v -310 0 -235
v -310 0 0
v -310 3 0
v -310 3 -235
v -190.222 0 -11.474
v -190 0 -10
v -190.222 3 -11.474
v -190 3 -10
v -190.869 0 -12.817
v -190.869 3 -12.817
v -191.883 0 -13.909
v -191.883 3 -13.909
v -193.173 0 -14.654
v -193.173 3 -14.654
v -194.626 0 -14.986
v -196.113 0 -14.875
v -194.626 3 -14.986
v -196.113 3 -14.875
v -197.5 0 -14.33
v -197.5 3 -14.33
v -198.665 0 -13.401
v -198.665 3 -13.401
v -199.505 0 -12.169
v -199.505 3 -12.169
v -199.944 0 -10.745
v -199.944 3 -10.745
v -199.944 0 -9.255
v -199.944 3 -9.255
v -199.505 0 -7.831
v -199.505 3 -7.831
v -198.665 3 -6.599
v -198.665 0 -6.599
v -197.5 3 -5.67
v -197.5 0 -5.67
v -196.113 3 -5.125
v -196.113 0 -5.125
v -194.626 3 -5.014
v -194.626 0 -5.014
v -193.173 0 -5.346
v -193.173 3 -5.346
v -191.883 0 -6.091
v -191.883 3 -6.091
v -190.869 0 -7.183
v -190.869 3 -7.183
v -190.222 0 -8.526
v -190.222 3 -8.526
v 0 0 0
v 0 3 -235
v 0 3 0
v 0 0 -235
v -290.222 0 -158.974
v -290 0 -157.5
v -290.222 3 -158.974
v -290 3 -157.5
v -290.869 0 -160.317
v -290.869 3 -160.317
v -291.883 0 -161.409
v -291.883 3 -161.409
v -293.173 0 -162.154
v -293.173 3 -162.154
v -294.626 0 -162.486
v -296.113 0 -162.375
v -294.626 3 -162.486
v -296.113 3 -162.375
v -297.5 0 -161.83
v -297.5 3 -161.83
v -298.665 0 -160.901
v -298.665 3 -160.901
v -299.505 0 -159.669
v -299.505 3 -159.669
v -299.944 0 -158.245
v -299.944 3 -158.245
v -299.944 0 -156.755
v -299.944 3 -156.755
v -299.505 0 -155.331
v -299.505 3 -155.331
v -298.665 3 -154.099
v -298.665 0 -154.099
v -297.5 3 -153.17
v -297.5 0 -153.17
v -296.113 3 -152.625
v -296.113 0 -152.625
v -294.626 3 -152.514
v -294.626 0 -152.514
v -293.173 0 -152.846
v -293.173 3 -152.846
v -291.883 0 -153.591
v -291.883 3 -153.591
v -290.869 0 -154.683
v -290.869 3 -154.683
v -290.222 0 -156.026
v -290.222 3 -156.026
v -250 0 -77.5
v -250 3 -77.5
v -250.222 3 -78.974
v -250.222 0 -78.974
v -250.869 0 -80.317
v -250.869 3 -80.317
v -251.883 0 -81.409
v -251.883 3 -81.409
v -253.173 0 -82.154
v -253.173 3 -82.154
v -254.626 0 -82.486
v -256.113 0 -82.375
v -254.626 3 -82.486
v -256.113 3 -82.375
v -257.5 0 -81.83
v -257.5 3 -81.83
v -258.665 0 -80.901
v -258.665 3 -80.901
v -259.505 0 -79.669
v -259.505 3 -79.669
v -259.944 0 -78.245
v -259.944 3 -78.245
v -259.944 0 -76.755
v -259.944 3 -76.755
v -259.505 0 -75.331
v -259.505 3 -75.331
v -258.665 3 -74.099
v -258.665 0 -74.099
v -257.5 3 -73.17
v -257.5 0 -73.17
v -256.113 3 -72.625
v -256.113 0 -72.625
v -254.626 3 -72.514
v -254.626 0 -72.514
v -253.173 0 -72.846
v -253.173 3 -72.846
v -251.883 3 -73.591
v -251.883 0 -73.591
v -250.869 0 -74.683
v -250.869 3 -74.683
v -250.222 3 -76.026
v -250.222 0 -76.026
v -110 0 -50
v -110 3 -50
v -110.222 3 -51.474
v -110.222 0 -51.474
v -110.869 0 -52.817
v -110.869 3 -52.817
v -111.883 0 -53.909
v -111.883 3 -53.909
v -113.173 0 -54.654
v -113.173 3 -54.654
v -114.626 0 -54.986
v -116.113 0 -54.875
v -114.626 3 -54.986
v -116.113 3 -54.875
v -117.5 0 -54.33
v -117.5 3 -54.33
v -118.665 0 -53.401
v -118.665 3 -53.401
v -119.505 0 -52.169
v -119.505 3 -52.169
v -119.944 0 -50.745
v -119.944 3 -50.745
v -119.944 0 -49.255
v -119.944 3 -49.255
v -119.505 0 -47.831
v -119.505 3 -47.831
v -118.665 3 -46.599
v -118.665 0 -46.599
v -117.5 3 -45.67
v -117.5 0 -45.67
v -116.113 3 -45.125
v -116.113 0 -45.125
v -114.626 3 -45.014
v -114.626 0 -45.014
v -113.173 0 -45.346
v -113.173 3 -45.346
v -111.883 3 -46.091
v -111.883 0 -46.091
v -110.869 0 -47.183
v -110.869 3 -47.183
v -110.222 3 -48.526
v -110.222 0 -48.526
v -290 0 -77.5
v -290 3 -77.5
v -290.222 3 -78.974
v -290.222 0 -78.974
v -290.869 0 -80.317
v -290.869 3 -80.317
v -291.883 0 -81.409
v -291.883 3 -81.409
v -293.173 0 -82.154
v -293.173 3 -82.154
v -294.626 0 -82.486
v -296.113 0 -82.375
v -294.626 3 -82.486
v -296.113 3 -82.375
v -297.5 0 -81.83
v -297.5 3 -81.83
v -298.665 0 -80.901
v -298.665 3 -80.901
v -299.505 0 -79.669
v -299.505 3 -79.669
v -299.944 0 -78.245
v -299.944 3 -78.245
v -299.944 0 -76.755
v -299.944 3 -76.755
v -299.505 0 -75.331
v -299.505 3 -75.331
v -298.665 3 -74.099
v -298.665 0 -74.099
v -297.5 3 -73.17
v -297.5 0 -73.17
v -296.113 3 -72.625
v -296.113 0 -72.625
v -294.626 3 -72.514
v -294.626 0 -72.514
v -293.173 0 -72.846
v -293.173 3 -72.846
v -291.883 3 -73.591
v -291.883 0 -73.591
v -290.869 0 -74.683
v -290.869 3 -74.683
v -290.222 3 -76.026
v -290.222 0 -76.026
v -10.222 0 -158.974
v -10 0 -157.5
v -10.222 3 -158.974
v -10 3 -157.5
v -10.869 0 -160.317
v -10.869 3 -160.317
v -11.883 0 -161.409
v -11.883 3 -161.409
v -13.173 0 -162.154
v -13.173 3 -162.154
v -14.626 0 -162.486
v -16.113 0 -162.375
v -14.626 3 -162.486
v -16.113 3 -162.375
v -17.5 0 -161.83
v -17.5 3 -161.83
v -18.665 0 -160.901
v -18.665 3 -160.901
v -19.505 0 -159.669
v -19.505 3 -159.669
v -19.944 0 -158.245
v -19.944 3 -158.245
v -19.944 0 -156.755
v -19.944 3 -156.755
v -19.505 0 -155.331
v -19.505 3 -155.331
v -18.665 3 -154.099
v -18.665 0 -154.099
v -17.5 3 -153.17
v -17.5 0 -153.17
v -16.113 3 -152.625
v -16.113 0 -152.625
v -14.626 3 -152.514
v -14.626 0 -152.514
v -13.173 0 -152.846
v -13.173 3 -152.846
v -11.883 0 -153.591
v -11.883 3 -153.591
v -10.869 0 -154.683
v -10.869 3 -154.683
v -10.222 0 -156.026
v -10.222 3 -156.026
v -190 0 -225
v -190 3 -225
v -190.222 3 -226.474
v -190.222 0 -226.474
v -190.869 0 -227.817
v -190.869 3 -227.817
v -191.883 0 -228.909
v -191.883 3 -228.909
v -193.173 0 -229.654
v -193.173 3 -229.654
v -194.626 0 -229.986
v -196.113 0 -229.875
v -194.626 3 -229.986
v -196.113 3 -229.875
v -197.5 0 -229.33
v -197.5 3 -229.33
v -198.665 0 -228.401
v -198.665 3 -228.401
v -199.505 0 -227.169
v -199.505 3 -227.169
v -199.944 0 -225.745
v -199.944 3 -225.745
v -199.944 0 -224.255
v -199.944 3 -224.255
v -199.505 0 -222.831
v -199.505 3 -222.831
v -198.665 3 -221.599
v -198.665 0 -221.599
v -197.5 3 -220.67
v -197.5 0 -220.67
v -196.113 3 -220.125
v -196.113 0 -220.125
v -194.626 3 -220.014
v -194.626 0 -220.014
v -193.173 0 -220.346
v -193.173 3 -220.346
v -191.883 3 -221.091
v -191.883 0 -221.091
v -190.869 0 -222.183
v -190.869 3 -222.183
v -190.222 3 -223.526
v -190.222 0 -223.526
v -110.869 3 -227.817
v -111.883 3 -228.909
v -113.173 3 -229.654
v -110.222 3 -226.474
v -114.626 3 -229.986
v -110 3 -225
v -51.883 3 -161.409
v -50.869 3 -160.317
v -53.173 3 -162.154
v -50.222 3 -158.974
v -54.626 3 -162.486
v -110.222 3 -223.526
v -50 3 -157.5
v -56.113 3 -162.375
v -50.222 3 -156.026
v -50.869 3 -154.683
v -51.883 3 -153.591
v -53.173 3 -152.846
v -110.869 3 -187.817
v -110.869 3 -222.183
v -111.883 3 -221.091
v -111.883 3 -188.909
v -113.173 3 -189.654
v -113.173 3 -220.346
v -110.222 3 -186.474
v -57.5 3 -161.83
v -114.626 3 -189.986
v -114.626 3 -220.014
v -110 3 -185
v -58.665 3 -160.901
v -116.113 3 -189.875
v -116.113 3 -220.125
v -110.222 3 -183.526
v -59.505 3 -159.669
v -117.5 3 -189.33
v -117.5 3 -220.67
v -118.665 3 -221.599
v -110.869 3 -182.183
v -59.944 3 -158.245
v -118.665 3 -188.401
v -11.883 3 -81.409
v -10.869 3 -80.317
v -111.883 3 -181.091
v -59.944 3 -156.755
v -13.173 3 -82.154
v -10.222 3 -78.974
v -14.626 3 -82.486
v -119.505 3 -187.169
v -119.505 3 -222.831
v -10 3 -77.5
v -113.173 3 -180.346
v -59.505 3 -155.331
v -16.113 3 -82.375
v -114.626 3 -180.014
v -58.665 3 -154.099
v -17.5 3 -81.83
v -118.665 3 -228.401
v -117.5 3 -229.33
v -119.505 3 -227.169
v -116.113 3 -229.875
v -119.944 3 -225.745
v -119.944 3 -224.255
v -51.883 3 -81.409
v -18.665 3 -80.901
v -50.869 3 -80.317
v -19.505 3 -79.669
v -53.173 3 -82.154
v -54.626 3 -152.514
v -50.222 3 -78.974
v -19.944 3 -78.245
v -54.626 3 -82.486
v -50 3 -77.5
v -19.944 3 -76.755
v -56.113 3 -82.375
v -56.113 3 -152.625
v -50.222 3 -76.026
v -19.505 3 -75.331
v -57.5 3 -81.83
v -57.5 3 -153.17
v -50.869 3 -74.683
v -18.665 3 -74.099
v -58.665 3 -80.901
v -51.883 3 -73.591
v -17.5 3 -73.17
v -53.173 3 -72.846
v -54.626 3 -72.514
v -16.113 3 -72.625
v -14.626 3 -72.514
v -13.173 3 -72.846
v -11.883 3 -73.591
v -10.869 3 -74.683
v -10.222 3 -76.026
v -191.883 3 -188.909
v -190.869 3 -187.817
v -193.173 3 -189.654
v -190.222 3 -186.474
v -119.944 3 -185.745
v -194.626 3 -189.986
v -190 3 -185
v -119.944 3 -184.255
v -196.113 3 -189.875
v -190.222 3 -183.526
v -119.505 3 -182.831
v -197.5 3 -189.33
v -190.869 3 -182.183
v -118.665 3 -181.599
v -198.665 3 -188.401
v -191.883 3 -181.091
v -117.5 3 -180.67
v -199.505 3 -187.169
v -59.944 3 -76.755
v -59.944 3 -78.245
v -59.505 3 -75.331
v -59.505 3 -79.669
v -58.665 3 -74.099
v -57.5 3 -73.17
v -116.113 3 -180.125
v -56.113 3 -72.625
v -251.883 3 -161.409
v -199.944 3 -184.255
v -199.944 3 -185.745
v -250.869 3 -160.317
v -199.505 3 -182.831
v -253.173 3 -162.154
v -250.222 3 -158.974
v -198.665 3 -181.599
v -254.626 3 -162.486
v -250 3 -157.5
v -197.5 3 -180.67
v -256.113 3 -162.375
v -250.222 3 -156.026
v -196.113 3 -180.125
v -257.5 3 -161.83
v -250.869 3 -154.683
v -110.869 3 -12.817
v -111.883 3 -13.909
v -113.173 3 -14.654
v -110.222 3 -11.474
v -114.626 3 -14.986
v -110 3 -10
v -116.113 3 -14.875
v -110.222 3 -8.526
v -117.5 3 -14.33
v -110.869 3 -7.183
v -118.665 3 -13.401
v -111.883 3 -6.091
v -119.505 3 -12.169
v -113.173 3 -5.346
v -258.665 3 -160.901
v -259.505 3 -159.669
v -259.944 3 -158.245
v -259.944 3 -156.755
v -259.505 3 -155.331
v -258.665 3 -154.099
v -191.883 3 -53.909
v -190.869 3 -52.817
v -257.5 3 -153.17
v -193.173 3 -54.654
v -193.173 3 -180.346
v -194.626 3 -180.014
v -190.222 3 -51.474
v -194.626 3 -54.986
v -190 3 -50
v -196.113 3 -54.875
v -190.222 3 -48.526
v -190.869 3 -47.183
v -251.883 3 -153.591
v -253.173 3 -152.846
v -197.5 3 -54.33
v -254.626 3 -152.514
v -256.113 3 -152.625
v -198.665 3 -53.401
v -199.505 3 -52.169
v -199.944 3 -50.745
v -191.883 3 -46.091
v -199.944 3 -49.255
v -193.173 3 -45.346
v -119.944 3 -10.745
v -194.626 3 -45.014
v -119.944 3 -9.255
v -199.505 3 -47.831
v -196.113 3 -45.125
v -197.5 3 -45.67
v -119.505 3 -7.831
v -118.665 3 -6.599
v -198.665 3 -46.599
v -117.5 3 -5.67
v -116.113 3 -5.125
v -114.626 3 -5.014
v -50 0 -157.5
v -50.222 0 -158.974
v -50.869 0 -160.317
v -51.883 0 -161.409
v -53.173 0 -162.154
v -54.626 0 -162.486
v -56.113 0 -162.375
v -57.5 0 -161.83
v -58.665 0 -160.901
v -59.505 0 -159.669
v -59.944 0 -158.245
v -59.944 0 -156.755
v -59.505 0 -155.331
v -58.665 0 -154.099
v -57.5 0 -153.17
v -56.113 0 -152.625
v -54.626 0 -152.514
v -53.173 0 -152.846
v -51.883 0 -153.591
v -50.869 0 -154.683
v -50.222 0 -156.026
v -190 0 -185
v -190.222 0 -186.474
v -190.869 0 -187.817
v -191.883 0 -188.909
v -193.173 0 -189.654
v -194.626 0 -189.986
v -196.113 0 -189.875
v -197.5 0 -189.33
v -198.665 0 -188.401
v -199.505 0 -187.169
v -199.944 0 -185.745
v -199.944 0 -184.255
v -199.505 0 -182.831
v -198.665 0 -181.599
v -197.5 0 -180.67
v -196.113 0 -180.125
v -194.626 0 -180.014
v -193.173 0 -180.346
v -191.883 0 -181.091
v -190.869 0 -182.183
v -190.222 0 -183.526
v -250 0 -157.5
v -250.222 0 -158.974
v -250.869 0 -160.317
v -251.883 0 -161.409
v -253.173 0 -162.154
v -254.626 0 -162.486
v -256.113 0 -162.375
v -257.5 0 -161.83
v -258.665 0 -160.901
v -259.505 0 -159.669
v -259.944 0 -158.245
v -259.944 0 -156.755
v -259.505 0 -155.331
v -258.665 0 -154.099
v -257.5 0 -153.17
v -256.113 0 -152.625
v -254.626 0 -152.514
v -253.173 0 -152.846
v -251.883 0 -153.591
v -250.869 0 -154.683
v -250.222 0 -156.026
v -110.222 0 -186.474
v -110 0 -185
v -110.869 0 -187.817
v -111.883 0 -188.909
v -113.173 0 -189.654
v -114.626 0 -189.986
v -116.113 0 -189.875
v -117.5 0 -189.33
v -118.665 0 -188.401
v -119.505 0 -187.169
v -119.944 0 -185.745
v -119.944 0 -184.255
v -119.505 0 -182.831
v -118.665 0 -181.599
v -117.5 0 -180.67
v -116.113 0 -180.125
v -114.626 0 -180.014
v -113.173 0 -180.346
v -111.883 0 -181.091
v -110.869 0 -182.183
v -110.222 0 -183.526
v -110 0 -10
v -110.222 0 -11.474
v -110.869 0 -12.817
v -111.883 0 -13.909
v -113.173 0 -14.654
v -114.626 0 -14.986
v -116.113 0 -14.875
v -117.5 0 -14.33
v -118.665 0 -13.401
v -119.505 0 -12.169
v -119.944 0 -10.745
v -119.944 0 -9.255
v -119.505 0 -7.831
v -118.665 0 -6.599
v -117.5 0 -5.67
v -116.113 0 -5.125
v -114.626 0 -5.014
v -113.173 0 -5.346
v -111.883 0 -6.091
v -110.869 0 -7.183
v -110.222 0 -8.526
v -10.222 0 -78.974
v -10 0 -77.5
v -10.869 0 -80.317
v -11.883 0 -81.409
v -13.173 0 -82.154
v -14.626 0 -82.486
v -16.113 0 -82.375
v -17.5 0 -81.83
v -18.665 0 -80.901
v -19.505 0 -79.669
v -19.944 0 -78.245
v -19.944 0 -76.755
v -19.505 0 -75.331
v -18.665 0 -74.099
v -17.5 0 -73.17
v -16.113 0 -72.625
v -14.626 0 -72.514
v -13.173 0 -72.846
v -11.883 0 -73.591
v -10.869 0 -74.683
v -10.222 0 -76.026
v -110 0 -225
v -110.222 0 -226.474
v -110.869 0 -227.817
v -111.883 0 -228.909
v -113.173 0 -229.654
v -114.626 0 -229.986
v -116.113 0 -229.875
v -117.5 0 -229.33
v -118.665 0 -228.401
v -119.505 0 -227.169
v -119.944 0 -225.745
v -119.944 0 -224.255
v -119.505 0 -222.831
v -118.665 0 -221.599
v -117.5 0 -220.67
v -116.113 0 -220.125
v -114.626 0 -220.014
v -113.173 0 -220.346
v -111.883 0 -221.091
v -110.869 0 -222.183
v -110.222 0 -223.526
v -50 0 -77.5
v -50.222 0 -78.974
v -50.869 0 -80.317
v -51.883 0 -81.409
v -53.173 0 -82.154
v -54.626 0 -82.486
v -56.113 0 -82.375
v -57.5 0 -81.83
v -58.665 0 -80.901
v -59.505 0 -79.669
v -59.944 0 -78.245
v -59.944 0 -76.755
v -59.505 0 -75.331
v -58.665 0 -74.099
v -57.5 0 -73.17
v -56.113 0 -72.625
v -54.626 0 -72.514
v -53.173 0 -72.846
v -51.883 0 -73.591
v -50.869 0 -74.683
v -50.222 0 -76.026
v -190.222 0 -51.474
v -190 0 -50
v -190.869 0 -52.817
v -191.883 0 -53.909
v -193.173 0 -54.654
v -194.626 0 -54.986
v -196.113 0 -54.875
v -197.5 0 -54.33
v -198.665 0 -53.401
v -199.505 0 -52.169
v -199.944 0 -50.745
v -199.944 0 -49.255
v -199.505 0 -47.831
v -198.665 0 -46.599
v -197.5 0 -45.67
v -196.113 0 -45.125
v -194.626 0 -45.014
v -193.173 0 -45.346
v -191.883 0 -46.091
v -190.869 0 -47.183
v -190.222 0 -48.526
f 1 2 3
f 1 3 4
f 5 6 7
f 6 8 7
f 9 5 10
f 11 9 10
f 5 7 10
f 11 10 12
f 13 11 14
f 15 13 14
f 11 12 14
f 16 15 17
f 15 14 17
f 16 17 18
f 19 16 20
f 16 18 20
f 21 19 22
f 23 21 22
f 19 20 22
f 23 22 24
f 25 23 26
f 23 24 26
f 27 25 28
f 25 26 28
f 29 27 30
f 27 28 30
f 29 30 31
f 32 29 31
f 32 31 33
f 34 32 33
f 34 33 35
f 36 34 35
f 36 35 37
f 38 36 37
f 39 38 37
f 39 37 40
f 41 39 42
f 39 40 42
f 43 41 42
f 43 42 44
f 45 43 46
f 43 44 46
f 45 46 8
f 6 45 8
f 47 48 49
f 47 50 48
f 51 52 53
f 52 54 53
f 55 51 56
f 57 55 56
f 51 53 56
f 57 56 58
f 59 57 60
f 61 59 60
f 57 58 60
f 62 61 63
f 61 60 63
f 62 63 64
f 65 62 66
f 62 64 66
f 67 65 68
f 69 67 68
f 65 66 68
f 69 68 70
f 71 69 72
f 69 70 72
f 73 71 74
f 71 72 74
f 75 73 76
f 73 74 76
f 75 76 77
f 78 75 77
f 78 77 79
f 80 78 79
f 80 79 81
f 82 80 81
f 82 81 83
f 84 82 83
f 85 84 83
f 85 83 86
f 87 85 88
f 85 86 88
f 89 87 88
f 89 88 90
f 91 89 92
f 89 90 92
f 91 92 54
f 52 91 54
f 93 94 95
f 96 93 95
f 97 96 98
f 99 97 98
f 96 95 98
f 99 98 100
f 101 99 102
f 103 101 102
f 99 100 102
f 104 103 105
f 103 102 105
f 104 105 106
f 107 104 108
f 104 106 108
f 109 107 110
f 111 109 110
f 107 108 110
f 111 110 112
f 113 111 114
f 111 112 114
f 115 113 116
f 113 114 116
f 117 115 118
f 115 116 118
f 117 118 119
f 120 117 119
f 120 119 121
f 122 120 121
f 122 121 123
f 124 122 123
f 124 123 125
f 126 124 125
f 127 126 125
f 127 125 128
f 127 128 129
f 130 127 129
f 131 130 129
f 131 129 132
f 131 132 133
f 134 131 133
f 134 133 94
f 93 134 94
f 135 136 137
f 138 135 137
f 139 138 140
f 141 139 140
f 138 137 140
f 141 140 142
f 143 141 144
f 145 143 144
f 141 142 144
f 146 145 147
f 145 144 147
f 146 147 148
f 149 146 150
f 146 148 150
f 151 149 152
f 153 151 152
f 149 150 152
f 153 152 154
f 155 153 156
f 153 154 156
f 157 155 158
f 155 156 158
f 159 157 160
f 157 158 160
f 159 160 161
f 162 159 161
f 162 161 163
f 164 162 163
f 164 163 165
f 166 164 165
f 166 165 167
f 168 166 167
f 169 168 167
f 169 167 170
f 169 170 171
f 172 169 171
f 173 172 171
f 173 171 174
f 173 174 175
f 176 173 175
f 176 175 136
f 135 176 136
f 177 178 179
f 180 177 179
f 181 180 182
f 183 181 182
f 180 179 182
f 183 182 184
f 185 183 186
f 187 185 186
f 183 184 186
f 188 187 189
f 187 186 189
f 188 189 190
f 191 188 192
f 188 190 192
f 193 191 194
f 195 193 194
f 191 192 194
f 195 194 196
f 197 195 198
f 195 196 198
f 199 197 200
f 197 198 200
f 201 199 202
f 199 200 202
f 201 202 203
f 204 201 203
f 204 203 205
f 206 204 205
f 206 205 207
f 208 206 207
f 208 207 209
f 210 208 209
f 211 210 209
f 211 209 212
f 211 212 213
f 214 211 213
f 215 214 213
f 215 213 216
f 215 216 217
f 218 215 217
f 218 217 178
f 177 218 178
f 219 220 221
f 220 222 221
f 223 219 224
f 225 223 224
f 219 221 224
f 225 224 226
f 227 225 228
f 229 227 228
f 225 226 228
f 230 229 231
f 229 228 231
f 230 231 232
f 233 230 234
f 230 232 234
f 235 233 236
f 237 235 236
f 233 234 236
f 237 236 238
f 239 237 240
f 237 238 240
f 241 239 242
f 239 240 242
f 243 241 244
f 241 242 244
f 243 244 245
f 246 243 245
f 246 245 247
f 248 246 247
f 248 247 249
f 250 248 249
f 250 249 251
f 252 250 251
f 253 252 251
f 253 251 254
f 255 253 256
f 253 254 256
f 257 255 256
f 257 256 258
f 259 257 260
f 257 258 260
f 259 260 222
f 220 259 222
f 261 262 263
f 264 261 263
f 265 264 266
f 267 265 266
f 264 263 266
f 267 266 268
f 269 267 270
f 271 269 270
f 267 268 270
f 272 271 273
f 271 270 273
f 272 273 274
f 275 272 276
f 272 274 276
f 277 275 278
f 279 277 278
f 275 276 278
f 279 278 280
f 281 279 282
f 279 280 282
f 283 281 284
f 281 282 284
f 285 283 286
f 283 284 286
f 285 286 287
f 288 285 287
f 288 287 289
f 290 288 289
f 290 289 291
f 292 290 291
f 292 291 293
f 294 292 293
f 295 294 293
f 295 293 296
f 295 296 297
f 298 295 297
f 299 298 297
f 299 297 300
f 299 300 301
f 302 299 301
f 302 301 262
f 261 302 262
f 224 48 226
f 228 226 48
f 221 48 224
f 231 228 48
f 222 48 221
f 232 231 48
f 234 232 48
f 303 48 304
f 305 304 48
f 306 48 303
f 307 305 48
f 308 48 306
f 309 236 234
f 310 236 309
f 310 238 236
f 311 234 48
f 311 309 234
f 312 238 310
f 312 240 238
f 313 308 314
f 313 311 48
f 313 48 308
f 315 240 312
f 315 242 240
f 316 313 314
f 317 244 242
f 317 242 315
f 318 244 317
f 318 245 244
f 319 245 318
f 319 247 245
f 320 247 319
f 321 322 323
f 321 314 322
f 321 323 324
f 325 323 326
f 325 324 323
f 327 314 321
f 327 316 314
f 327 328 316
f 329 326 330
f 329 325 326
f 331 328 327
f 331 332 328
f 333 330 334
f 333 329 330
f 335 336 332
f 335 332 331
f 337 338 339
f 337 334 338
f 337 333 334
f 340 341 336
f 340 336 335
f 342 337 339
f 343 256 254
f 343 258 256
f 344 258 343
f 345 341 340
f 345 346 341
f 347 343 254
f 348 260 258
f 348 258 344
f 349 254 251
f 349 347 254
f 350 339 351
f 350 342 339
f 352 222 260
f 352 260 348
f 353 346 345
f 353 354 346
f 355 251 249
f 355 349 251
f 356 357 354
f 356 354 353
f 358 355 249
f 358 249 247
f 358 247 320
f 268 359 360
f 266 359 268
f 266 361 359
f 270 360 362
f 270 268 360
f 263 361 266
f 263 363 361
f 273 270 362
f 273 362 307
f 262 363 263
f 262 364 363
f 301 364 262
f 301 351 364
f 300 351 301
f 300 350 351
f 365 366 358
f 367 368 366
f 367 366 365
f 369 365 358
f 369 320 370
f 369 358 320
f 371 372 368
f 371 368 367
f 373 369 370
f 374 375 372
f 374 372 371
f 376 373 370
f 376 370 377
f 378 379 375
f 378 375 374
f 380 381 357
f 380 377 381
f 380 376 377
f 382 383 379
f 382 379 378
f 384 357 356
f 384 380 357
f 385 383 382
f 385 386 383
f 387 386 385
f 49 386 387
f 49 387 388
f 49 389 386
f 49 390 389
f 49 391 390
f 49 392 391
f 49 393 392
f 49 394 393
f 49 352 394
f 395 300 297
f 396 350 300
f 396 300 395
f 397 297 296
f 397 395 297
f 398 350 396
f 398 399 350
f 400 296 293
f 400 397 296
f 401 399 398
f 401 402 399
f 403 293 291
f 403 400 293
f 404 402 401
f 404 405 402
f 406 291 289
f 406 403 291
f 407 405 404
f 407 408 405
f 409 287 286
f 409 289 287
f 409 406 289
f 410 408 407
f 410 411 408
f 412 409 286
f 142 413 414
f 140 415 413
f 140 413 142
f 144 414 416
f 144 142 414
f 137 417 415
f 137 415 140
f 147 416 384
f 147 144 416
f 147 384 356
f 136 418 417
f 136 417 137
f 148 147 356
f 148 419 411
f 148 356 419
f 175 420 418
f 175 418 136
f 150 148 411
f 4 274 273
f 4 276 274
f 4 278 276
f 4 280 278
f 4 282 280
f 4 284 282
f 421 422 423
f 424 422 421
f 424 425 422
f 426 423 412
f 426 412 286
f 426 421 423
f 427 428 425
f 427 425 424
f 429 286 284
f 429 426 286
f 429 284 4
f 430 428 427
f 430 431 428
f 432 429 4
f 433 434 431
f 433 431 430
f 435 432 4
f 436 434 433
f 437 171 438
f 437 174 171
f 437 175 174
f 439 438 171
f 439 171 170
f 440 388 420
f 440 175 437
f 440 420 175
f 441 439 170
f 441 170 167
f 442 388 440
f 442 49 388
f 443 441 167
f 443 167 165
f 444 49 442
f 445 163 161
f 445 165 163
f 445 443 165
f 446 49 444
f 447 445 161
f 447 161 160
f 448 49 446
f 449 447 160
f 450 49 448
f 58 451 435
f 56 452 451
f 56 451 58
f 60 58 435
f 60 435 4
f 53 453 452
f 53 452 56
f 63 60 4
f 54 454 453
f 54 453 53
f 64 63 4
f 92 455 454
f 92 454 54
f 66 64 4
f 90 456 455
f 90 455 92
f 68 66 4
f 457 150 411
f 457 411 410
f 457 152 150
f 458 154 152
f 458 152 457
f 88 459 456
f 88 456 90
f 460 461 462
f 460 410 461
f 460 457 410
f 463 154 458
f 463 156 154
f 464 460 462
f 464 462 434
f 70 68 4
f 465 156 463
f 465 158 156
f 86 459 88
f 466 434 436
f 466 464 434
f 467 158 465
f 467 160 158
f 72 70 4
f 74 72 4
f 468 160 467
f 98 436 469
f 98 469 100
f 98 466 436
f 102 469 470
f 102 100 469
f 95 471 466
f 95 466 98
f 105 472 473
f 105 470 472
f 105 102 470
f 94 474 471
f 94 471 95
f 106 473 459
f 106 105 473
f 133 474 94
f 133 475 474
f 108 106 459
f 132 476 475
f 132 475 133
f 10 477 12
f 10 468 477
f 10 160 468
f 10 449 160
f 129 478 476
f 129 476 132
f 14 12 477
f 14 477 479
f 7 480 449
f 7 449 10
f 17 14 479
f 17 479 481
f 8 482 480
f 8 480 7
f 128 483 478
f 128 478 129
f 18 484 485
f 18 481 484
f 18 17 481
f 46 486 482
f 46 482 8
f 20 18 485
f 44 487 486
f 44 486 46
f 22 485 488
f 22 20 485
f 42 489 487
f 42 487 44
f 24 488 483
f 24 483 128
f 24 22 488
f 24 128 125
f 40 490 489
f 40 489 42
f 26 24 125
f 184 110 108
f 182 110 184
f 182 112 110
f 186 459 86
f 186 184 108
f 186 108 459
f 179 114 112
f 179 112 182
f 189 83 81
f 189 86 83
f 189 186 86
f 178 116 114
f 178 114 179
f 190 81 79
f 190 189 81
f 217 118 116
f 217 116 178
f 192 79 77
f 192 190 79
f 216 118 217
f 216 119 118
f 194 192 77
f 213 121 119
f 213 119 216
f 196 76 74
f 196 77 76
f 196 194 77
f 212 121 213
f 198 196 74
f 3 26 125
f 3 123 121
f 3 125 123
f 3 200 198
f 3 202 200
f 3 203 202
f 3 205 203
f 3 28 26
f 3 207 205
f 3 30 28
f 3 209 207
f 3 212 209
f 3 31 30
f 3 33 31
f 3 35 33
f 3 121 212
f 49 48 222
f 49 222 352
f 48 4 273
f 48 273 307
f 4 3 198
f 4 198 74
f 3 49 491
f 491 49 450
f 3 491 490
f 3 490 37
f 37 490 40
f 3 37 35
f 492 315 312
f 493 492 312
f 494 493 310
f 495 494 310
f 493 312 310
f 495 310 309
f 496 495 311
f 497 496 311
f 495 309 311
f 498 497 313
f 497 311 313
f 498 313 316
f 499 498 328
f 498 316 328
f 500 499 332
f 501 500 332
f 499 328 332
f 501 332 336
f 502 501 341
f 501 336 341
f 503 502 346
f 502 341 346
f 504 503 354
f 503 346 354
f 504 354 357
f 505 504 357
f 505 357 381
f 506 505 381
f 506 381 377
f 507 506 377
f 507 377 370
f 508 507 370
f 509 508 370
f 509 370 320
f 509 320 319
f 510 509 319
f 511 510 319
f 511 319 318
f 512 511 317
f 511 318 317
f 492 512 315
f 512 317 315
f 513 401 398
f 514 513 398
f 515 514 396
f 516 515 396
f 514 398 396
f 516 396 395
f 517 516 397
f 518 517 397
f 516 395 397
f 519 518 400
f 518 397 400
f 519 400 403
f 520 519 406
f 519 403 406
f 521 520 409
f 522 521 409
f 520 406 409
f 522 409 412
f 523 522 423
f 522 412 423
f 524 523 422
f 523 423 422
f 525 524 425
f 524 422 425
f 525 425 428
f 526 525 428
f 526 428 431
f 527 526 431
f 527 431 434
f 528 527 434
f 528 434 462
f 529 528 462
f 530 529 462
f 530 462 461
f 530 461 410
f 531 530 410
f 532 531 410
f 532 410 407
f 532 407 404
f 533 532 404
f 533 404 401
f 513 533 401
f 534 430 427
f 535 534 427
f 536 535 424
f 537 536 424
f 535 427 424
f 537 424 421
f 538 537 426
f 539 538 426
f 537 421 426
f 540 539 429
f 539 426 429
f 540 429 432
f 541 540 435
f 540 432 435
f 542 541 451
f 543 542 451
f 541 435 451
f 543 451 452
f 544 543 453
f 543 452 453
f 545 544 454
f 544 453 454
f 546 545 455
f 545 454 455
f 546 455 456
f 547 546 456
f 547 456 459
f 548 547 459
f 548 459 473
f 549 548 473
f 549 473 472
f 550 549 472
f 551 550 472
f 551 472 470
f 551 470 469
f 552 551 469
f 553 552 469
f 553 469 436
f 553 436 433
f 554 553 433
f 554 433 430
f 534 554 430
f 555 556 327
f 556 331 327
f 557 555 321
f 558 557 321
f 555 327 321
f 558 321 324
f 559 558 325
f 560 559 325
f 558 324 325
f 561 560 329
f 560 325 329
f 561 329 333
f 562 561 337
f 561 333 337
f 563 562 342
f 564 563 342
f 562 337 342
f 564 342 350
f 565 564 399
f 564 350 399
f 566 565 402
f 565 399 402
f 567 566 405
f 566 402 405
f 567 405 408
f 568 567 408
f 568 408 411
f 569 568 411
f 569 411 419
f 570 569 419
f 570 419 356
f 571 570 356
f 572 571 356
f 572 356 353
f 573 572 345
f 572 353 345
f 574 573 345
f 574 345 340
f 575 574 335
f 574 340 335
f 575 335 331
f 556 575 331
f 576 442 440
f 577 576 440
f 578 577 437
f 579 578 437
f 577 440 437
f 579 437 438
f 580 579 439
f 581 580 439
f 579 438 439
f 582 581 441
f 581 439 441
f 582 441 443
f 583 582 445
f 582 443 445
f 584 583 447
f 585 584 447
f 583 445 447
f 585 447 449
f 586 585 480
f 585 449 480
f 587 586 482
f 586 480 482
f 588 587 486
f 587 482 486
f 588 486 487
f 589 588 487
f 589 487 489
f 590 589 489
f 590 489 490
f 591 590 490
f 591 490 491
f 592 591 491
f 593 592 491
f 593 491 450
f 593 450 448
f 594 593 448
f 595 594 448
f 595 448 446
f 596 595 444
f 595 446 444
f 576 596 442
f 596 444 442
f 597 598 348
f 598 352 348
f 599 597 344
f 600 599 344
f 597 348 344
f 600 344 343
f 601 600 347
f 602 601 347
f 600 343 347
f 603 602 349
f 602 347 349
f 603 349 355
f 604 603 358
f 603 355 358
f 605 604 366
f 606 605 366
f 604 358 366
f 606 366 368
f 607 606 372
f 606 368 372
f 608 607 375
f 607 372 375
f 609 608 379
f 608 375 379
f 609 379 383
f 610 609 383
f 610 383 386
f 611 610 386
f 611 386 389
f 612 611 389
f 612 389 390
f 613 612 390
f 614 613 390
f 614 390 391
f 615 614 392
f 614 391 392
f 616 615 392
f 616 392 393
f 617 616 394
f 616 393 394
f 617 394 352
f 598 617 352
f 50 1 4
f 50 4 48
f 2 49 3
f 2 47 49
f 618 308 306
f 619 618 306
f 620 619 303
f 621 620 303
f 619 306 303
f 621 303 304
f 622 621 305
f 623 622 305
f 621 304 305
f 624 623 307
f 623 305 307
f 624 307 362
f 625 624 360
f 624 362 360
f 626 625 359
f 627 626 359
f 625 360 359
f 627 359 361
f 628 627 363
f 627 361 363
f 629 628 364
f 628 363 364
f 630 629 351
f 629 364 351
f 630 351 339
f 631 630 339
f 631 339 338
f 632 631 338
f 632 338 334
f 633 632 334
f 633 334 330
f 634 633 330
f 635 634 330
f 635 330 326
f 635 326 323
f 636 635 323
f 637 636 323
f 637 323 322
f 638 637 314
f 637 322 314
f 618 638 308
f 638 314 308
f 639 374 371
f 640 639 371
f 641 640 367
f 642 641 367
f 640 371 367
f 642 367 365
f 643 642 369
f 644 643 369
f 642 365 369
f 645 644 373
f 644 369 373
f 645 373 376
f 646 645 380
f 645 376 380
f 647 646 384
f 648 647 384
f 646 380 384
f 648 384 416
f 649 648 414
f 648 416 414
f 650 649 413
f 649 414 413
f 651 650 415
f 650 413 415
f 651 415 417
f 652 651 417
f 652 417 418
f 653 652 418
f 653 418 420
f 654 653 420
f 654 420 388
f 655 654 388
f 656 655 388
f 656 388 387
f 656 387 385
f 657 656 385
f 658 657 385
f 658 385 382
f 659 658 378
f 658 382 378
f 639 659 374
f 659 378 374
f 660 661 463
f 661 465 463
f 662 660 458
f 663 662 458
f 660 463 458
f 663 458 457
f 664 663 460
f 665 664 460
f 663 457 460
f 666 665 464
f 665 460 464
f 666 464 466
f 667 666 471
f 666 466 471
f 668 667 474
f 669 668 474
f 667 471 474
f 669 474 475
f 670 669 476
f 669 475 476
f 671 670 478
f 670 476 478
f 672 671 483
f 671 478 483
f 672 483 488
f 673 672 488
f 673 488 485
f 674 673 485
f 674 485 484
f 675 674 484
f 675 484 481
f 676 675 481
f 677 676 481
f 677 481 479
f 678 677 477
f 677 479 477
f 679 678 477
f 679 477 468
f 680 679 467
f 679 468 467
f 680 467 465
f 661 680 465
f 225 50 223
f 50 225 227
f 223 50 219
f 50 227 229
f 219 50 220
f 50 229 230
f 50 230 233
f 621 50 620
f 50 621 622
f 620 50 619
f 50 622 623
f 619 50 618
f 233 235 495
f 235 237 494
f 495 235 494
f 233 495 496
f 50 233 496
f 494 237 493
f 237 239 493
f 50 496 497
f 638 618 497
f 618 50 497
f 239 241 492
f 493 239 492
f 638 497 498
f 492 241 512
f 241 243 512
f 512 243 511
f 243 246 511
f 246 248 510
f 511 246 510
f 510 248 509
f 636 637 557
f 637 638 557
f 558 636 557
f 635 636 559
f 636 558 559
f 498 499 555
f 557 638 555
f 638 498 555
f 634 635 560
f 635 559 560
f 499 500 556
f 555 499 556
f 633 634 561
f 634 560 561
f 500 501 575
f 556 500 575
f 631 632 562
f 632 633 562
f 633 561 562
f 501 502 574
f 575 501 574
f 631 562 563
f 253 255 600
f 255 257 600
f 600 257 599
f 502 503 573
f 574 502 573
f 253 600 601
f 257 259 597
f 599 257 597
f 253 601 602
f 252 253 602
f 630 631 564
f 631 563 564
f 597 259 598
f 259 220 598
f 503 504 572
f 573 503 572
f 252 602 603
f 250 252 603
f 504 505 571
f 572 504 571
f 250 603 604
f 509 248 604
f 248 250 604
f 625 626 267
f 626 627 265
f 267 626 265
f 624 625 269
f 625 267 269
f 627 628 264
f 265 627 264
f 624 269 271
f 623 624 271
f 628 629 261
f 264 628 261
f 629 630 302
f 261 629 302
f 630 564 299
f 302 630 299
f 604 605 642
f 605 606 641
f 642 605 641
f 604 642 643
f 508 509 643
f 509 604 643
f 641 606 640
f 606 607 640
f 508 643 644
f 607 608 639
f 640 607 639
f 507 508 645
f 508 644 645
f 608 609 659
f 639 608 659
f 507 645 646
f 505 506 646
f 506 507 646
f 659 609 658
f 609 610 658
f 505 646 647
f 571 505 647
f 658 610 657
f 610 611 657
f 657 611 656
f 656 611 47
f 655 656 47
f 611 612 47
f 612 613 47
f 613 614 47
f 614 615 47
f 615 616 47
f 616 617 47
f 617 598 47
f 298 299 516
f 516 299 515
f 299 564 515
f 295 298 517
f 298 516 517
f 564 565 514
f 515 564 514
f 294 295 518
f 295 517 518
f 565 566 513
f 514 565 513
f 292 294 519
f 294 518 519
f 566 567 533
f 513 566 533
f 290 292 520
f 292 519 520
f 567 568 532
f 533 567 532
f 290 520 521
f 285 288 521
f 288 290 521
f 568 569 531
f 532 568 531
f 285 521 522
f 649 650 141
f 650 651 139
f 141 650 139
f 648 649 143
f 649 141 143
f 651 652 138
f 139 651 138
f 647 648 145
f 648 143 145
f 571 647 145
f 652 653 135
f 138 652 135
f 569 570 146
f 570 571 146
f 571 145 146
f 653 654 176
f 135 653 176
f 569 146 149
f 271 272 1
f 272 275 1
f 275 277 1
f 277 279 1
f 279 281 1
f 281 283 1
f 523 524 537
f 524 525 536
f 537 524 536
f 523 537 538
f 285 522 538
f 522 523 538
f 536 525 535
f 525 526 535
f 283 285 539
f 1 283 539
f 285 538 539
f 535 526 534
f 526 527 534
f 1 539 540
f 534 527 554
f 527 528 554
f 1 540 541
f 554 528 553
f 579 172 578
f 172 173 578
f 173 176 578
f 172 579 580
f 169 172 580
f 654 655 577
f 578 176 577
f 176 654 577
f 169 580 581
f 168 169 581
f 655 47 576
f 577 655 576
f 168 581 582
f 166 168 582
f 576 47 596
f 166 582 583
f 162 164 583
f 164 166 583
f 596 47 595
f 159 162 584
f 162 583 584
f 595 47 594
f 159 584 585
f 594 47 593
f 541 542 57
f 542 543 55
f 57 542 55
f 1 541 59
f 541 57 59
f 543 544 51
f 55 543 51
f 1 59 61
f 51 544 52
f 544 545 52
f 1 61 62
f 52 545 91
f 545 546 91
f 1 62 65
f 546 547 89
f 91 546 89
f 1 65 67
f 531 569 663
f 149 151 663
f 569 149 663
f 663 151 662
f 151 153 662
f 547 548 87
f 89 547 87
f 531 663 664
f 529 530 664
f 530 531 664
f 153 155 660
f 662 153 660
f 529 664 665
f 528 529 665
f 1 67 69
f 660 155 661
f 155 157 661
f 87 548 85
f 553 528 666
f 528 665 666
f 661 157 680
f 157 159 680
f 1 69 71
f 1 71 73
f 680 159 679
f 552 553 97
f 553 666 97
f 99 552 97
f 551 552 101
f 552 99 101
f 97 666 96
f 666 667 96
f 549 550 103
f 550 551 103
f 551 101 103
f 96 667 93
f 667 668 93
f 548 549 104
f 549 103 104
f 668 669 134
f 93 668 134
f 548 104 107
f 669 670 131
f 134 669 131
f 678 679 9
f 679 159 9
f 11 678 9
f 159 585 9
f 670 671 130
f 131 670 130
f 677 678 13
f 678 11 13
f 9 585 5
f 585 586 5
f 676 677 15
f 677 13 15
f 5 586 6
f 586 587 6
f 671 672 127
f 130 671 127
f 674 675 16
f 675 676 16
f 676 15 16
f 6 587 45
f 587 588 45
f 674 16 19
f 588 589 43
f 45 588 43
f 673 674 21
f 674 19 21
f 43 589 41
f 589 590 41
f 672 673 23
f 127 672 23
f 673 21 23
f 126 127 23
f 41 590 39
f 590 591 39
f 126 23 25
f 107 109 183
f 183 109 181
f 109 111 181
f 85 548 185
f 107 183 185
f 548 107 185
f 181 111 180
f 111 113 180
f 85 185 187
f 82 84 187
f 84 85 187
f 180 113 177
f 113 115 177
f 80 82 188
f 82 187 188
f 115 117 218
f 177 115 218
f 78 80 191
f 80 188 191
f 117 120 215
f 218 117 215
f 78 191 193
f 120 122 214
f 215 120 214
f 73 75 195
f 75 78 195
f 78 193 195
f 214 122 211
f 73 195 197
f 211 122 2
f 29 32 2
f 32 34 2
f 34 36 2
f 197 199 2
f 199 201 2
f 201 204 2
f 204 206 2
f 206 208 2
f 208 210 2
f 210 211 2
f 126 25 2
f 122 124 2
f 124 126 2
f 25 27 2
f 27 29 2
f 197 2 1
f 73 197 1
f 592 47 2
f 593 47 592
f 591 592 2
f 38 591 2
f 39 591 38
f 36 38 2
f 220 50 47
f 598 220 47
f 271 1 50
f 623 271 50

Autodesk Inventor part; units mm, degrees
ref_plane "YZ Plane" through (0, 0, 0) normal (1, 0, 0) x (0, 1, 0)
ref_plane "XZ Plane" through (0, 0, 0) normal (0, 1, 0) x (-1, 0, 0)
ref_plane "XY Plane" through (0, 0, 0) normal (0, 0, 1) x (1, 0, 0)
sketch "スケッチ1" plane through (0, 0, 0) normal (0, 1, 0) x (-1, 0, 0)
  line L0 (0, 0) -> (310, 0)
  line L1 (310, 0) -> (310, -235)
  line L2 (310, -235) -> (0, -235)
  line L3 (0, -235) -> (0, 0)
  dimension "d0" = 310
  dimension "d1" = 235
extrude "押し出し1" add sketch "スケッチ1" along normal blind 3
sketch "スケッチ2" plane through (0, 3, 0) normal (0, 1, 0) x (1, 0, 0)
  line L0 (-155, -40) -> (-155, 284.5269)
  line L1 (-155, 284.5269) -> (-194.2717, 284.5269)
  line L2 (30, 117.5) -> (-350, 117.5)
  line L3 (0, 0) -> (0, 235) projected
  line L4 (-310, 0) -> (0, 0) projected
  circle A0 centre (-195, 10) radius 5
  circle A1 centre (-115, 10) radius 5
  circle A2 centre (-195, 225) radius 5
  circle A3 centre (-115, 225) radius 5
  circle A4 centre (-195, 50) radius 5
  circle A5 centre (-115, 50) radius 5
  circle A6 centre (-195, 185) radius 5
  circle A7 centre (-115, 185) radius 5
  circle A8 centre (-295, 157.5) radius 5
  line L5 (-310, 235) -> (-310, 0) projected
  circle A9 centre (-295, 77.5) radius 5
  circle A10 centre (-15, 157.5) radius 5
  circle A11 centre (-15, 77.5) radius 5
  circle A12 centre (-255, 157.5) radius 5
  circle A13 centre (-255, 77.5) radius 5
  circle A14 centre (-55, 157.5) radius 5
  circle A15 centre (-55, 77.5) radius 5
  dimension "d4" = 155
  dimension "d5" = 117.5
  dimension "d6" = 10
  dimension "d7" = 40
  dimension "d8" = 10
  dimension "d9" = 10
  dimension "d10" = 40
  dimension "d11" = 10
  dimension "d12" = 15
  dimension "d13" = 40
  dimension "d14" = 10
  dimension "d15" = 40
extrude "押し出し2" cut sketch "スケッチ2" against normal blind 3 contours A0 | A1 | A2 | A3 | A4 | A5 | A6 | A7 | A8 | A9 | A10 | A11 | A12 | A13 | A14 | A15
properties part number "base_diff_02" material "アルミニウム 6061"
